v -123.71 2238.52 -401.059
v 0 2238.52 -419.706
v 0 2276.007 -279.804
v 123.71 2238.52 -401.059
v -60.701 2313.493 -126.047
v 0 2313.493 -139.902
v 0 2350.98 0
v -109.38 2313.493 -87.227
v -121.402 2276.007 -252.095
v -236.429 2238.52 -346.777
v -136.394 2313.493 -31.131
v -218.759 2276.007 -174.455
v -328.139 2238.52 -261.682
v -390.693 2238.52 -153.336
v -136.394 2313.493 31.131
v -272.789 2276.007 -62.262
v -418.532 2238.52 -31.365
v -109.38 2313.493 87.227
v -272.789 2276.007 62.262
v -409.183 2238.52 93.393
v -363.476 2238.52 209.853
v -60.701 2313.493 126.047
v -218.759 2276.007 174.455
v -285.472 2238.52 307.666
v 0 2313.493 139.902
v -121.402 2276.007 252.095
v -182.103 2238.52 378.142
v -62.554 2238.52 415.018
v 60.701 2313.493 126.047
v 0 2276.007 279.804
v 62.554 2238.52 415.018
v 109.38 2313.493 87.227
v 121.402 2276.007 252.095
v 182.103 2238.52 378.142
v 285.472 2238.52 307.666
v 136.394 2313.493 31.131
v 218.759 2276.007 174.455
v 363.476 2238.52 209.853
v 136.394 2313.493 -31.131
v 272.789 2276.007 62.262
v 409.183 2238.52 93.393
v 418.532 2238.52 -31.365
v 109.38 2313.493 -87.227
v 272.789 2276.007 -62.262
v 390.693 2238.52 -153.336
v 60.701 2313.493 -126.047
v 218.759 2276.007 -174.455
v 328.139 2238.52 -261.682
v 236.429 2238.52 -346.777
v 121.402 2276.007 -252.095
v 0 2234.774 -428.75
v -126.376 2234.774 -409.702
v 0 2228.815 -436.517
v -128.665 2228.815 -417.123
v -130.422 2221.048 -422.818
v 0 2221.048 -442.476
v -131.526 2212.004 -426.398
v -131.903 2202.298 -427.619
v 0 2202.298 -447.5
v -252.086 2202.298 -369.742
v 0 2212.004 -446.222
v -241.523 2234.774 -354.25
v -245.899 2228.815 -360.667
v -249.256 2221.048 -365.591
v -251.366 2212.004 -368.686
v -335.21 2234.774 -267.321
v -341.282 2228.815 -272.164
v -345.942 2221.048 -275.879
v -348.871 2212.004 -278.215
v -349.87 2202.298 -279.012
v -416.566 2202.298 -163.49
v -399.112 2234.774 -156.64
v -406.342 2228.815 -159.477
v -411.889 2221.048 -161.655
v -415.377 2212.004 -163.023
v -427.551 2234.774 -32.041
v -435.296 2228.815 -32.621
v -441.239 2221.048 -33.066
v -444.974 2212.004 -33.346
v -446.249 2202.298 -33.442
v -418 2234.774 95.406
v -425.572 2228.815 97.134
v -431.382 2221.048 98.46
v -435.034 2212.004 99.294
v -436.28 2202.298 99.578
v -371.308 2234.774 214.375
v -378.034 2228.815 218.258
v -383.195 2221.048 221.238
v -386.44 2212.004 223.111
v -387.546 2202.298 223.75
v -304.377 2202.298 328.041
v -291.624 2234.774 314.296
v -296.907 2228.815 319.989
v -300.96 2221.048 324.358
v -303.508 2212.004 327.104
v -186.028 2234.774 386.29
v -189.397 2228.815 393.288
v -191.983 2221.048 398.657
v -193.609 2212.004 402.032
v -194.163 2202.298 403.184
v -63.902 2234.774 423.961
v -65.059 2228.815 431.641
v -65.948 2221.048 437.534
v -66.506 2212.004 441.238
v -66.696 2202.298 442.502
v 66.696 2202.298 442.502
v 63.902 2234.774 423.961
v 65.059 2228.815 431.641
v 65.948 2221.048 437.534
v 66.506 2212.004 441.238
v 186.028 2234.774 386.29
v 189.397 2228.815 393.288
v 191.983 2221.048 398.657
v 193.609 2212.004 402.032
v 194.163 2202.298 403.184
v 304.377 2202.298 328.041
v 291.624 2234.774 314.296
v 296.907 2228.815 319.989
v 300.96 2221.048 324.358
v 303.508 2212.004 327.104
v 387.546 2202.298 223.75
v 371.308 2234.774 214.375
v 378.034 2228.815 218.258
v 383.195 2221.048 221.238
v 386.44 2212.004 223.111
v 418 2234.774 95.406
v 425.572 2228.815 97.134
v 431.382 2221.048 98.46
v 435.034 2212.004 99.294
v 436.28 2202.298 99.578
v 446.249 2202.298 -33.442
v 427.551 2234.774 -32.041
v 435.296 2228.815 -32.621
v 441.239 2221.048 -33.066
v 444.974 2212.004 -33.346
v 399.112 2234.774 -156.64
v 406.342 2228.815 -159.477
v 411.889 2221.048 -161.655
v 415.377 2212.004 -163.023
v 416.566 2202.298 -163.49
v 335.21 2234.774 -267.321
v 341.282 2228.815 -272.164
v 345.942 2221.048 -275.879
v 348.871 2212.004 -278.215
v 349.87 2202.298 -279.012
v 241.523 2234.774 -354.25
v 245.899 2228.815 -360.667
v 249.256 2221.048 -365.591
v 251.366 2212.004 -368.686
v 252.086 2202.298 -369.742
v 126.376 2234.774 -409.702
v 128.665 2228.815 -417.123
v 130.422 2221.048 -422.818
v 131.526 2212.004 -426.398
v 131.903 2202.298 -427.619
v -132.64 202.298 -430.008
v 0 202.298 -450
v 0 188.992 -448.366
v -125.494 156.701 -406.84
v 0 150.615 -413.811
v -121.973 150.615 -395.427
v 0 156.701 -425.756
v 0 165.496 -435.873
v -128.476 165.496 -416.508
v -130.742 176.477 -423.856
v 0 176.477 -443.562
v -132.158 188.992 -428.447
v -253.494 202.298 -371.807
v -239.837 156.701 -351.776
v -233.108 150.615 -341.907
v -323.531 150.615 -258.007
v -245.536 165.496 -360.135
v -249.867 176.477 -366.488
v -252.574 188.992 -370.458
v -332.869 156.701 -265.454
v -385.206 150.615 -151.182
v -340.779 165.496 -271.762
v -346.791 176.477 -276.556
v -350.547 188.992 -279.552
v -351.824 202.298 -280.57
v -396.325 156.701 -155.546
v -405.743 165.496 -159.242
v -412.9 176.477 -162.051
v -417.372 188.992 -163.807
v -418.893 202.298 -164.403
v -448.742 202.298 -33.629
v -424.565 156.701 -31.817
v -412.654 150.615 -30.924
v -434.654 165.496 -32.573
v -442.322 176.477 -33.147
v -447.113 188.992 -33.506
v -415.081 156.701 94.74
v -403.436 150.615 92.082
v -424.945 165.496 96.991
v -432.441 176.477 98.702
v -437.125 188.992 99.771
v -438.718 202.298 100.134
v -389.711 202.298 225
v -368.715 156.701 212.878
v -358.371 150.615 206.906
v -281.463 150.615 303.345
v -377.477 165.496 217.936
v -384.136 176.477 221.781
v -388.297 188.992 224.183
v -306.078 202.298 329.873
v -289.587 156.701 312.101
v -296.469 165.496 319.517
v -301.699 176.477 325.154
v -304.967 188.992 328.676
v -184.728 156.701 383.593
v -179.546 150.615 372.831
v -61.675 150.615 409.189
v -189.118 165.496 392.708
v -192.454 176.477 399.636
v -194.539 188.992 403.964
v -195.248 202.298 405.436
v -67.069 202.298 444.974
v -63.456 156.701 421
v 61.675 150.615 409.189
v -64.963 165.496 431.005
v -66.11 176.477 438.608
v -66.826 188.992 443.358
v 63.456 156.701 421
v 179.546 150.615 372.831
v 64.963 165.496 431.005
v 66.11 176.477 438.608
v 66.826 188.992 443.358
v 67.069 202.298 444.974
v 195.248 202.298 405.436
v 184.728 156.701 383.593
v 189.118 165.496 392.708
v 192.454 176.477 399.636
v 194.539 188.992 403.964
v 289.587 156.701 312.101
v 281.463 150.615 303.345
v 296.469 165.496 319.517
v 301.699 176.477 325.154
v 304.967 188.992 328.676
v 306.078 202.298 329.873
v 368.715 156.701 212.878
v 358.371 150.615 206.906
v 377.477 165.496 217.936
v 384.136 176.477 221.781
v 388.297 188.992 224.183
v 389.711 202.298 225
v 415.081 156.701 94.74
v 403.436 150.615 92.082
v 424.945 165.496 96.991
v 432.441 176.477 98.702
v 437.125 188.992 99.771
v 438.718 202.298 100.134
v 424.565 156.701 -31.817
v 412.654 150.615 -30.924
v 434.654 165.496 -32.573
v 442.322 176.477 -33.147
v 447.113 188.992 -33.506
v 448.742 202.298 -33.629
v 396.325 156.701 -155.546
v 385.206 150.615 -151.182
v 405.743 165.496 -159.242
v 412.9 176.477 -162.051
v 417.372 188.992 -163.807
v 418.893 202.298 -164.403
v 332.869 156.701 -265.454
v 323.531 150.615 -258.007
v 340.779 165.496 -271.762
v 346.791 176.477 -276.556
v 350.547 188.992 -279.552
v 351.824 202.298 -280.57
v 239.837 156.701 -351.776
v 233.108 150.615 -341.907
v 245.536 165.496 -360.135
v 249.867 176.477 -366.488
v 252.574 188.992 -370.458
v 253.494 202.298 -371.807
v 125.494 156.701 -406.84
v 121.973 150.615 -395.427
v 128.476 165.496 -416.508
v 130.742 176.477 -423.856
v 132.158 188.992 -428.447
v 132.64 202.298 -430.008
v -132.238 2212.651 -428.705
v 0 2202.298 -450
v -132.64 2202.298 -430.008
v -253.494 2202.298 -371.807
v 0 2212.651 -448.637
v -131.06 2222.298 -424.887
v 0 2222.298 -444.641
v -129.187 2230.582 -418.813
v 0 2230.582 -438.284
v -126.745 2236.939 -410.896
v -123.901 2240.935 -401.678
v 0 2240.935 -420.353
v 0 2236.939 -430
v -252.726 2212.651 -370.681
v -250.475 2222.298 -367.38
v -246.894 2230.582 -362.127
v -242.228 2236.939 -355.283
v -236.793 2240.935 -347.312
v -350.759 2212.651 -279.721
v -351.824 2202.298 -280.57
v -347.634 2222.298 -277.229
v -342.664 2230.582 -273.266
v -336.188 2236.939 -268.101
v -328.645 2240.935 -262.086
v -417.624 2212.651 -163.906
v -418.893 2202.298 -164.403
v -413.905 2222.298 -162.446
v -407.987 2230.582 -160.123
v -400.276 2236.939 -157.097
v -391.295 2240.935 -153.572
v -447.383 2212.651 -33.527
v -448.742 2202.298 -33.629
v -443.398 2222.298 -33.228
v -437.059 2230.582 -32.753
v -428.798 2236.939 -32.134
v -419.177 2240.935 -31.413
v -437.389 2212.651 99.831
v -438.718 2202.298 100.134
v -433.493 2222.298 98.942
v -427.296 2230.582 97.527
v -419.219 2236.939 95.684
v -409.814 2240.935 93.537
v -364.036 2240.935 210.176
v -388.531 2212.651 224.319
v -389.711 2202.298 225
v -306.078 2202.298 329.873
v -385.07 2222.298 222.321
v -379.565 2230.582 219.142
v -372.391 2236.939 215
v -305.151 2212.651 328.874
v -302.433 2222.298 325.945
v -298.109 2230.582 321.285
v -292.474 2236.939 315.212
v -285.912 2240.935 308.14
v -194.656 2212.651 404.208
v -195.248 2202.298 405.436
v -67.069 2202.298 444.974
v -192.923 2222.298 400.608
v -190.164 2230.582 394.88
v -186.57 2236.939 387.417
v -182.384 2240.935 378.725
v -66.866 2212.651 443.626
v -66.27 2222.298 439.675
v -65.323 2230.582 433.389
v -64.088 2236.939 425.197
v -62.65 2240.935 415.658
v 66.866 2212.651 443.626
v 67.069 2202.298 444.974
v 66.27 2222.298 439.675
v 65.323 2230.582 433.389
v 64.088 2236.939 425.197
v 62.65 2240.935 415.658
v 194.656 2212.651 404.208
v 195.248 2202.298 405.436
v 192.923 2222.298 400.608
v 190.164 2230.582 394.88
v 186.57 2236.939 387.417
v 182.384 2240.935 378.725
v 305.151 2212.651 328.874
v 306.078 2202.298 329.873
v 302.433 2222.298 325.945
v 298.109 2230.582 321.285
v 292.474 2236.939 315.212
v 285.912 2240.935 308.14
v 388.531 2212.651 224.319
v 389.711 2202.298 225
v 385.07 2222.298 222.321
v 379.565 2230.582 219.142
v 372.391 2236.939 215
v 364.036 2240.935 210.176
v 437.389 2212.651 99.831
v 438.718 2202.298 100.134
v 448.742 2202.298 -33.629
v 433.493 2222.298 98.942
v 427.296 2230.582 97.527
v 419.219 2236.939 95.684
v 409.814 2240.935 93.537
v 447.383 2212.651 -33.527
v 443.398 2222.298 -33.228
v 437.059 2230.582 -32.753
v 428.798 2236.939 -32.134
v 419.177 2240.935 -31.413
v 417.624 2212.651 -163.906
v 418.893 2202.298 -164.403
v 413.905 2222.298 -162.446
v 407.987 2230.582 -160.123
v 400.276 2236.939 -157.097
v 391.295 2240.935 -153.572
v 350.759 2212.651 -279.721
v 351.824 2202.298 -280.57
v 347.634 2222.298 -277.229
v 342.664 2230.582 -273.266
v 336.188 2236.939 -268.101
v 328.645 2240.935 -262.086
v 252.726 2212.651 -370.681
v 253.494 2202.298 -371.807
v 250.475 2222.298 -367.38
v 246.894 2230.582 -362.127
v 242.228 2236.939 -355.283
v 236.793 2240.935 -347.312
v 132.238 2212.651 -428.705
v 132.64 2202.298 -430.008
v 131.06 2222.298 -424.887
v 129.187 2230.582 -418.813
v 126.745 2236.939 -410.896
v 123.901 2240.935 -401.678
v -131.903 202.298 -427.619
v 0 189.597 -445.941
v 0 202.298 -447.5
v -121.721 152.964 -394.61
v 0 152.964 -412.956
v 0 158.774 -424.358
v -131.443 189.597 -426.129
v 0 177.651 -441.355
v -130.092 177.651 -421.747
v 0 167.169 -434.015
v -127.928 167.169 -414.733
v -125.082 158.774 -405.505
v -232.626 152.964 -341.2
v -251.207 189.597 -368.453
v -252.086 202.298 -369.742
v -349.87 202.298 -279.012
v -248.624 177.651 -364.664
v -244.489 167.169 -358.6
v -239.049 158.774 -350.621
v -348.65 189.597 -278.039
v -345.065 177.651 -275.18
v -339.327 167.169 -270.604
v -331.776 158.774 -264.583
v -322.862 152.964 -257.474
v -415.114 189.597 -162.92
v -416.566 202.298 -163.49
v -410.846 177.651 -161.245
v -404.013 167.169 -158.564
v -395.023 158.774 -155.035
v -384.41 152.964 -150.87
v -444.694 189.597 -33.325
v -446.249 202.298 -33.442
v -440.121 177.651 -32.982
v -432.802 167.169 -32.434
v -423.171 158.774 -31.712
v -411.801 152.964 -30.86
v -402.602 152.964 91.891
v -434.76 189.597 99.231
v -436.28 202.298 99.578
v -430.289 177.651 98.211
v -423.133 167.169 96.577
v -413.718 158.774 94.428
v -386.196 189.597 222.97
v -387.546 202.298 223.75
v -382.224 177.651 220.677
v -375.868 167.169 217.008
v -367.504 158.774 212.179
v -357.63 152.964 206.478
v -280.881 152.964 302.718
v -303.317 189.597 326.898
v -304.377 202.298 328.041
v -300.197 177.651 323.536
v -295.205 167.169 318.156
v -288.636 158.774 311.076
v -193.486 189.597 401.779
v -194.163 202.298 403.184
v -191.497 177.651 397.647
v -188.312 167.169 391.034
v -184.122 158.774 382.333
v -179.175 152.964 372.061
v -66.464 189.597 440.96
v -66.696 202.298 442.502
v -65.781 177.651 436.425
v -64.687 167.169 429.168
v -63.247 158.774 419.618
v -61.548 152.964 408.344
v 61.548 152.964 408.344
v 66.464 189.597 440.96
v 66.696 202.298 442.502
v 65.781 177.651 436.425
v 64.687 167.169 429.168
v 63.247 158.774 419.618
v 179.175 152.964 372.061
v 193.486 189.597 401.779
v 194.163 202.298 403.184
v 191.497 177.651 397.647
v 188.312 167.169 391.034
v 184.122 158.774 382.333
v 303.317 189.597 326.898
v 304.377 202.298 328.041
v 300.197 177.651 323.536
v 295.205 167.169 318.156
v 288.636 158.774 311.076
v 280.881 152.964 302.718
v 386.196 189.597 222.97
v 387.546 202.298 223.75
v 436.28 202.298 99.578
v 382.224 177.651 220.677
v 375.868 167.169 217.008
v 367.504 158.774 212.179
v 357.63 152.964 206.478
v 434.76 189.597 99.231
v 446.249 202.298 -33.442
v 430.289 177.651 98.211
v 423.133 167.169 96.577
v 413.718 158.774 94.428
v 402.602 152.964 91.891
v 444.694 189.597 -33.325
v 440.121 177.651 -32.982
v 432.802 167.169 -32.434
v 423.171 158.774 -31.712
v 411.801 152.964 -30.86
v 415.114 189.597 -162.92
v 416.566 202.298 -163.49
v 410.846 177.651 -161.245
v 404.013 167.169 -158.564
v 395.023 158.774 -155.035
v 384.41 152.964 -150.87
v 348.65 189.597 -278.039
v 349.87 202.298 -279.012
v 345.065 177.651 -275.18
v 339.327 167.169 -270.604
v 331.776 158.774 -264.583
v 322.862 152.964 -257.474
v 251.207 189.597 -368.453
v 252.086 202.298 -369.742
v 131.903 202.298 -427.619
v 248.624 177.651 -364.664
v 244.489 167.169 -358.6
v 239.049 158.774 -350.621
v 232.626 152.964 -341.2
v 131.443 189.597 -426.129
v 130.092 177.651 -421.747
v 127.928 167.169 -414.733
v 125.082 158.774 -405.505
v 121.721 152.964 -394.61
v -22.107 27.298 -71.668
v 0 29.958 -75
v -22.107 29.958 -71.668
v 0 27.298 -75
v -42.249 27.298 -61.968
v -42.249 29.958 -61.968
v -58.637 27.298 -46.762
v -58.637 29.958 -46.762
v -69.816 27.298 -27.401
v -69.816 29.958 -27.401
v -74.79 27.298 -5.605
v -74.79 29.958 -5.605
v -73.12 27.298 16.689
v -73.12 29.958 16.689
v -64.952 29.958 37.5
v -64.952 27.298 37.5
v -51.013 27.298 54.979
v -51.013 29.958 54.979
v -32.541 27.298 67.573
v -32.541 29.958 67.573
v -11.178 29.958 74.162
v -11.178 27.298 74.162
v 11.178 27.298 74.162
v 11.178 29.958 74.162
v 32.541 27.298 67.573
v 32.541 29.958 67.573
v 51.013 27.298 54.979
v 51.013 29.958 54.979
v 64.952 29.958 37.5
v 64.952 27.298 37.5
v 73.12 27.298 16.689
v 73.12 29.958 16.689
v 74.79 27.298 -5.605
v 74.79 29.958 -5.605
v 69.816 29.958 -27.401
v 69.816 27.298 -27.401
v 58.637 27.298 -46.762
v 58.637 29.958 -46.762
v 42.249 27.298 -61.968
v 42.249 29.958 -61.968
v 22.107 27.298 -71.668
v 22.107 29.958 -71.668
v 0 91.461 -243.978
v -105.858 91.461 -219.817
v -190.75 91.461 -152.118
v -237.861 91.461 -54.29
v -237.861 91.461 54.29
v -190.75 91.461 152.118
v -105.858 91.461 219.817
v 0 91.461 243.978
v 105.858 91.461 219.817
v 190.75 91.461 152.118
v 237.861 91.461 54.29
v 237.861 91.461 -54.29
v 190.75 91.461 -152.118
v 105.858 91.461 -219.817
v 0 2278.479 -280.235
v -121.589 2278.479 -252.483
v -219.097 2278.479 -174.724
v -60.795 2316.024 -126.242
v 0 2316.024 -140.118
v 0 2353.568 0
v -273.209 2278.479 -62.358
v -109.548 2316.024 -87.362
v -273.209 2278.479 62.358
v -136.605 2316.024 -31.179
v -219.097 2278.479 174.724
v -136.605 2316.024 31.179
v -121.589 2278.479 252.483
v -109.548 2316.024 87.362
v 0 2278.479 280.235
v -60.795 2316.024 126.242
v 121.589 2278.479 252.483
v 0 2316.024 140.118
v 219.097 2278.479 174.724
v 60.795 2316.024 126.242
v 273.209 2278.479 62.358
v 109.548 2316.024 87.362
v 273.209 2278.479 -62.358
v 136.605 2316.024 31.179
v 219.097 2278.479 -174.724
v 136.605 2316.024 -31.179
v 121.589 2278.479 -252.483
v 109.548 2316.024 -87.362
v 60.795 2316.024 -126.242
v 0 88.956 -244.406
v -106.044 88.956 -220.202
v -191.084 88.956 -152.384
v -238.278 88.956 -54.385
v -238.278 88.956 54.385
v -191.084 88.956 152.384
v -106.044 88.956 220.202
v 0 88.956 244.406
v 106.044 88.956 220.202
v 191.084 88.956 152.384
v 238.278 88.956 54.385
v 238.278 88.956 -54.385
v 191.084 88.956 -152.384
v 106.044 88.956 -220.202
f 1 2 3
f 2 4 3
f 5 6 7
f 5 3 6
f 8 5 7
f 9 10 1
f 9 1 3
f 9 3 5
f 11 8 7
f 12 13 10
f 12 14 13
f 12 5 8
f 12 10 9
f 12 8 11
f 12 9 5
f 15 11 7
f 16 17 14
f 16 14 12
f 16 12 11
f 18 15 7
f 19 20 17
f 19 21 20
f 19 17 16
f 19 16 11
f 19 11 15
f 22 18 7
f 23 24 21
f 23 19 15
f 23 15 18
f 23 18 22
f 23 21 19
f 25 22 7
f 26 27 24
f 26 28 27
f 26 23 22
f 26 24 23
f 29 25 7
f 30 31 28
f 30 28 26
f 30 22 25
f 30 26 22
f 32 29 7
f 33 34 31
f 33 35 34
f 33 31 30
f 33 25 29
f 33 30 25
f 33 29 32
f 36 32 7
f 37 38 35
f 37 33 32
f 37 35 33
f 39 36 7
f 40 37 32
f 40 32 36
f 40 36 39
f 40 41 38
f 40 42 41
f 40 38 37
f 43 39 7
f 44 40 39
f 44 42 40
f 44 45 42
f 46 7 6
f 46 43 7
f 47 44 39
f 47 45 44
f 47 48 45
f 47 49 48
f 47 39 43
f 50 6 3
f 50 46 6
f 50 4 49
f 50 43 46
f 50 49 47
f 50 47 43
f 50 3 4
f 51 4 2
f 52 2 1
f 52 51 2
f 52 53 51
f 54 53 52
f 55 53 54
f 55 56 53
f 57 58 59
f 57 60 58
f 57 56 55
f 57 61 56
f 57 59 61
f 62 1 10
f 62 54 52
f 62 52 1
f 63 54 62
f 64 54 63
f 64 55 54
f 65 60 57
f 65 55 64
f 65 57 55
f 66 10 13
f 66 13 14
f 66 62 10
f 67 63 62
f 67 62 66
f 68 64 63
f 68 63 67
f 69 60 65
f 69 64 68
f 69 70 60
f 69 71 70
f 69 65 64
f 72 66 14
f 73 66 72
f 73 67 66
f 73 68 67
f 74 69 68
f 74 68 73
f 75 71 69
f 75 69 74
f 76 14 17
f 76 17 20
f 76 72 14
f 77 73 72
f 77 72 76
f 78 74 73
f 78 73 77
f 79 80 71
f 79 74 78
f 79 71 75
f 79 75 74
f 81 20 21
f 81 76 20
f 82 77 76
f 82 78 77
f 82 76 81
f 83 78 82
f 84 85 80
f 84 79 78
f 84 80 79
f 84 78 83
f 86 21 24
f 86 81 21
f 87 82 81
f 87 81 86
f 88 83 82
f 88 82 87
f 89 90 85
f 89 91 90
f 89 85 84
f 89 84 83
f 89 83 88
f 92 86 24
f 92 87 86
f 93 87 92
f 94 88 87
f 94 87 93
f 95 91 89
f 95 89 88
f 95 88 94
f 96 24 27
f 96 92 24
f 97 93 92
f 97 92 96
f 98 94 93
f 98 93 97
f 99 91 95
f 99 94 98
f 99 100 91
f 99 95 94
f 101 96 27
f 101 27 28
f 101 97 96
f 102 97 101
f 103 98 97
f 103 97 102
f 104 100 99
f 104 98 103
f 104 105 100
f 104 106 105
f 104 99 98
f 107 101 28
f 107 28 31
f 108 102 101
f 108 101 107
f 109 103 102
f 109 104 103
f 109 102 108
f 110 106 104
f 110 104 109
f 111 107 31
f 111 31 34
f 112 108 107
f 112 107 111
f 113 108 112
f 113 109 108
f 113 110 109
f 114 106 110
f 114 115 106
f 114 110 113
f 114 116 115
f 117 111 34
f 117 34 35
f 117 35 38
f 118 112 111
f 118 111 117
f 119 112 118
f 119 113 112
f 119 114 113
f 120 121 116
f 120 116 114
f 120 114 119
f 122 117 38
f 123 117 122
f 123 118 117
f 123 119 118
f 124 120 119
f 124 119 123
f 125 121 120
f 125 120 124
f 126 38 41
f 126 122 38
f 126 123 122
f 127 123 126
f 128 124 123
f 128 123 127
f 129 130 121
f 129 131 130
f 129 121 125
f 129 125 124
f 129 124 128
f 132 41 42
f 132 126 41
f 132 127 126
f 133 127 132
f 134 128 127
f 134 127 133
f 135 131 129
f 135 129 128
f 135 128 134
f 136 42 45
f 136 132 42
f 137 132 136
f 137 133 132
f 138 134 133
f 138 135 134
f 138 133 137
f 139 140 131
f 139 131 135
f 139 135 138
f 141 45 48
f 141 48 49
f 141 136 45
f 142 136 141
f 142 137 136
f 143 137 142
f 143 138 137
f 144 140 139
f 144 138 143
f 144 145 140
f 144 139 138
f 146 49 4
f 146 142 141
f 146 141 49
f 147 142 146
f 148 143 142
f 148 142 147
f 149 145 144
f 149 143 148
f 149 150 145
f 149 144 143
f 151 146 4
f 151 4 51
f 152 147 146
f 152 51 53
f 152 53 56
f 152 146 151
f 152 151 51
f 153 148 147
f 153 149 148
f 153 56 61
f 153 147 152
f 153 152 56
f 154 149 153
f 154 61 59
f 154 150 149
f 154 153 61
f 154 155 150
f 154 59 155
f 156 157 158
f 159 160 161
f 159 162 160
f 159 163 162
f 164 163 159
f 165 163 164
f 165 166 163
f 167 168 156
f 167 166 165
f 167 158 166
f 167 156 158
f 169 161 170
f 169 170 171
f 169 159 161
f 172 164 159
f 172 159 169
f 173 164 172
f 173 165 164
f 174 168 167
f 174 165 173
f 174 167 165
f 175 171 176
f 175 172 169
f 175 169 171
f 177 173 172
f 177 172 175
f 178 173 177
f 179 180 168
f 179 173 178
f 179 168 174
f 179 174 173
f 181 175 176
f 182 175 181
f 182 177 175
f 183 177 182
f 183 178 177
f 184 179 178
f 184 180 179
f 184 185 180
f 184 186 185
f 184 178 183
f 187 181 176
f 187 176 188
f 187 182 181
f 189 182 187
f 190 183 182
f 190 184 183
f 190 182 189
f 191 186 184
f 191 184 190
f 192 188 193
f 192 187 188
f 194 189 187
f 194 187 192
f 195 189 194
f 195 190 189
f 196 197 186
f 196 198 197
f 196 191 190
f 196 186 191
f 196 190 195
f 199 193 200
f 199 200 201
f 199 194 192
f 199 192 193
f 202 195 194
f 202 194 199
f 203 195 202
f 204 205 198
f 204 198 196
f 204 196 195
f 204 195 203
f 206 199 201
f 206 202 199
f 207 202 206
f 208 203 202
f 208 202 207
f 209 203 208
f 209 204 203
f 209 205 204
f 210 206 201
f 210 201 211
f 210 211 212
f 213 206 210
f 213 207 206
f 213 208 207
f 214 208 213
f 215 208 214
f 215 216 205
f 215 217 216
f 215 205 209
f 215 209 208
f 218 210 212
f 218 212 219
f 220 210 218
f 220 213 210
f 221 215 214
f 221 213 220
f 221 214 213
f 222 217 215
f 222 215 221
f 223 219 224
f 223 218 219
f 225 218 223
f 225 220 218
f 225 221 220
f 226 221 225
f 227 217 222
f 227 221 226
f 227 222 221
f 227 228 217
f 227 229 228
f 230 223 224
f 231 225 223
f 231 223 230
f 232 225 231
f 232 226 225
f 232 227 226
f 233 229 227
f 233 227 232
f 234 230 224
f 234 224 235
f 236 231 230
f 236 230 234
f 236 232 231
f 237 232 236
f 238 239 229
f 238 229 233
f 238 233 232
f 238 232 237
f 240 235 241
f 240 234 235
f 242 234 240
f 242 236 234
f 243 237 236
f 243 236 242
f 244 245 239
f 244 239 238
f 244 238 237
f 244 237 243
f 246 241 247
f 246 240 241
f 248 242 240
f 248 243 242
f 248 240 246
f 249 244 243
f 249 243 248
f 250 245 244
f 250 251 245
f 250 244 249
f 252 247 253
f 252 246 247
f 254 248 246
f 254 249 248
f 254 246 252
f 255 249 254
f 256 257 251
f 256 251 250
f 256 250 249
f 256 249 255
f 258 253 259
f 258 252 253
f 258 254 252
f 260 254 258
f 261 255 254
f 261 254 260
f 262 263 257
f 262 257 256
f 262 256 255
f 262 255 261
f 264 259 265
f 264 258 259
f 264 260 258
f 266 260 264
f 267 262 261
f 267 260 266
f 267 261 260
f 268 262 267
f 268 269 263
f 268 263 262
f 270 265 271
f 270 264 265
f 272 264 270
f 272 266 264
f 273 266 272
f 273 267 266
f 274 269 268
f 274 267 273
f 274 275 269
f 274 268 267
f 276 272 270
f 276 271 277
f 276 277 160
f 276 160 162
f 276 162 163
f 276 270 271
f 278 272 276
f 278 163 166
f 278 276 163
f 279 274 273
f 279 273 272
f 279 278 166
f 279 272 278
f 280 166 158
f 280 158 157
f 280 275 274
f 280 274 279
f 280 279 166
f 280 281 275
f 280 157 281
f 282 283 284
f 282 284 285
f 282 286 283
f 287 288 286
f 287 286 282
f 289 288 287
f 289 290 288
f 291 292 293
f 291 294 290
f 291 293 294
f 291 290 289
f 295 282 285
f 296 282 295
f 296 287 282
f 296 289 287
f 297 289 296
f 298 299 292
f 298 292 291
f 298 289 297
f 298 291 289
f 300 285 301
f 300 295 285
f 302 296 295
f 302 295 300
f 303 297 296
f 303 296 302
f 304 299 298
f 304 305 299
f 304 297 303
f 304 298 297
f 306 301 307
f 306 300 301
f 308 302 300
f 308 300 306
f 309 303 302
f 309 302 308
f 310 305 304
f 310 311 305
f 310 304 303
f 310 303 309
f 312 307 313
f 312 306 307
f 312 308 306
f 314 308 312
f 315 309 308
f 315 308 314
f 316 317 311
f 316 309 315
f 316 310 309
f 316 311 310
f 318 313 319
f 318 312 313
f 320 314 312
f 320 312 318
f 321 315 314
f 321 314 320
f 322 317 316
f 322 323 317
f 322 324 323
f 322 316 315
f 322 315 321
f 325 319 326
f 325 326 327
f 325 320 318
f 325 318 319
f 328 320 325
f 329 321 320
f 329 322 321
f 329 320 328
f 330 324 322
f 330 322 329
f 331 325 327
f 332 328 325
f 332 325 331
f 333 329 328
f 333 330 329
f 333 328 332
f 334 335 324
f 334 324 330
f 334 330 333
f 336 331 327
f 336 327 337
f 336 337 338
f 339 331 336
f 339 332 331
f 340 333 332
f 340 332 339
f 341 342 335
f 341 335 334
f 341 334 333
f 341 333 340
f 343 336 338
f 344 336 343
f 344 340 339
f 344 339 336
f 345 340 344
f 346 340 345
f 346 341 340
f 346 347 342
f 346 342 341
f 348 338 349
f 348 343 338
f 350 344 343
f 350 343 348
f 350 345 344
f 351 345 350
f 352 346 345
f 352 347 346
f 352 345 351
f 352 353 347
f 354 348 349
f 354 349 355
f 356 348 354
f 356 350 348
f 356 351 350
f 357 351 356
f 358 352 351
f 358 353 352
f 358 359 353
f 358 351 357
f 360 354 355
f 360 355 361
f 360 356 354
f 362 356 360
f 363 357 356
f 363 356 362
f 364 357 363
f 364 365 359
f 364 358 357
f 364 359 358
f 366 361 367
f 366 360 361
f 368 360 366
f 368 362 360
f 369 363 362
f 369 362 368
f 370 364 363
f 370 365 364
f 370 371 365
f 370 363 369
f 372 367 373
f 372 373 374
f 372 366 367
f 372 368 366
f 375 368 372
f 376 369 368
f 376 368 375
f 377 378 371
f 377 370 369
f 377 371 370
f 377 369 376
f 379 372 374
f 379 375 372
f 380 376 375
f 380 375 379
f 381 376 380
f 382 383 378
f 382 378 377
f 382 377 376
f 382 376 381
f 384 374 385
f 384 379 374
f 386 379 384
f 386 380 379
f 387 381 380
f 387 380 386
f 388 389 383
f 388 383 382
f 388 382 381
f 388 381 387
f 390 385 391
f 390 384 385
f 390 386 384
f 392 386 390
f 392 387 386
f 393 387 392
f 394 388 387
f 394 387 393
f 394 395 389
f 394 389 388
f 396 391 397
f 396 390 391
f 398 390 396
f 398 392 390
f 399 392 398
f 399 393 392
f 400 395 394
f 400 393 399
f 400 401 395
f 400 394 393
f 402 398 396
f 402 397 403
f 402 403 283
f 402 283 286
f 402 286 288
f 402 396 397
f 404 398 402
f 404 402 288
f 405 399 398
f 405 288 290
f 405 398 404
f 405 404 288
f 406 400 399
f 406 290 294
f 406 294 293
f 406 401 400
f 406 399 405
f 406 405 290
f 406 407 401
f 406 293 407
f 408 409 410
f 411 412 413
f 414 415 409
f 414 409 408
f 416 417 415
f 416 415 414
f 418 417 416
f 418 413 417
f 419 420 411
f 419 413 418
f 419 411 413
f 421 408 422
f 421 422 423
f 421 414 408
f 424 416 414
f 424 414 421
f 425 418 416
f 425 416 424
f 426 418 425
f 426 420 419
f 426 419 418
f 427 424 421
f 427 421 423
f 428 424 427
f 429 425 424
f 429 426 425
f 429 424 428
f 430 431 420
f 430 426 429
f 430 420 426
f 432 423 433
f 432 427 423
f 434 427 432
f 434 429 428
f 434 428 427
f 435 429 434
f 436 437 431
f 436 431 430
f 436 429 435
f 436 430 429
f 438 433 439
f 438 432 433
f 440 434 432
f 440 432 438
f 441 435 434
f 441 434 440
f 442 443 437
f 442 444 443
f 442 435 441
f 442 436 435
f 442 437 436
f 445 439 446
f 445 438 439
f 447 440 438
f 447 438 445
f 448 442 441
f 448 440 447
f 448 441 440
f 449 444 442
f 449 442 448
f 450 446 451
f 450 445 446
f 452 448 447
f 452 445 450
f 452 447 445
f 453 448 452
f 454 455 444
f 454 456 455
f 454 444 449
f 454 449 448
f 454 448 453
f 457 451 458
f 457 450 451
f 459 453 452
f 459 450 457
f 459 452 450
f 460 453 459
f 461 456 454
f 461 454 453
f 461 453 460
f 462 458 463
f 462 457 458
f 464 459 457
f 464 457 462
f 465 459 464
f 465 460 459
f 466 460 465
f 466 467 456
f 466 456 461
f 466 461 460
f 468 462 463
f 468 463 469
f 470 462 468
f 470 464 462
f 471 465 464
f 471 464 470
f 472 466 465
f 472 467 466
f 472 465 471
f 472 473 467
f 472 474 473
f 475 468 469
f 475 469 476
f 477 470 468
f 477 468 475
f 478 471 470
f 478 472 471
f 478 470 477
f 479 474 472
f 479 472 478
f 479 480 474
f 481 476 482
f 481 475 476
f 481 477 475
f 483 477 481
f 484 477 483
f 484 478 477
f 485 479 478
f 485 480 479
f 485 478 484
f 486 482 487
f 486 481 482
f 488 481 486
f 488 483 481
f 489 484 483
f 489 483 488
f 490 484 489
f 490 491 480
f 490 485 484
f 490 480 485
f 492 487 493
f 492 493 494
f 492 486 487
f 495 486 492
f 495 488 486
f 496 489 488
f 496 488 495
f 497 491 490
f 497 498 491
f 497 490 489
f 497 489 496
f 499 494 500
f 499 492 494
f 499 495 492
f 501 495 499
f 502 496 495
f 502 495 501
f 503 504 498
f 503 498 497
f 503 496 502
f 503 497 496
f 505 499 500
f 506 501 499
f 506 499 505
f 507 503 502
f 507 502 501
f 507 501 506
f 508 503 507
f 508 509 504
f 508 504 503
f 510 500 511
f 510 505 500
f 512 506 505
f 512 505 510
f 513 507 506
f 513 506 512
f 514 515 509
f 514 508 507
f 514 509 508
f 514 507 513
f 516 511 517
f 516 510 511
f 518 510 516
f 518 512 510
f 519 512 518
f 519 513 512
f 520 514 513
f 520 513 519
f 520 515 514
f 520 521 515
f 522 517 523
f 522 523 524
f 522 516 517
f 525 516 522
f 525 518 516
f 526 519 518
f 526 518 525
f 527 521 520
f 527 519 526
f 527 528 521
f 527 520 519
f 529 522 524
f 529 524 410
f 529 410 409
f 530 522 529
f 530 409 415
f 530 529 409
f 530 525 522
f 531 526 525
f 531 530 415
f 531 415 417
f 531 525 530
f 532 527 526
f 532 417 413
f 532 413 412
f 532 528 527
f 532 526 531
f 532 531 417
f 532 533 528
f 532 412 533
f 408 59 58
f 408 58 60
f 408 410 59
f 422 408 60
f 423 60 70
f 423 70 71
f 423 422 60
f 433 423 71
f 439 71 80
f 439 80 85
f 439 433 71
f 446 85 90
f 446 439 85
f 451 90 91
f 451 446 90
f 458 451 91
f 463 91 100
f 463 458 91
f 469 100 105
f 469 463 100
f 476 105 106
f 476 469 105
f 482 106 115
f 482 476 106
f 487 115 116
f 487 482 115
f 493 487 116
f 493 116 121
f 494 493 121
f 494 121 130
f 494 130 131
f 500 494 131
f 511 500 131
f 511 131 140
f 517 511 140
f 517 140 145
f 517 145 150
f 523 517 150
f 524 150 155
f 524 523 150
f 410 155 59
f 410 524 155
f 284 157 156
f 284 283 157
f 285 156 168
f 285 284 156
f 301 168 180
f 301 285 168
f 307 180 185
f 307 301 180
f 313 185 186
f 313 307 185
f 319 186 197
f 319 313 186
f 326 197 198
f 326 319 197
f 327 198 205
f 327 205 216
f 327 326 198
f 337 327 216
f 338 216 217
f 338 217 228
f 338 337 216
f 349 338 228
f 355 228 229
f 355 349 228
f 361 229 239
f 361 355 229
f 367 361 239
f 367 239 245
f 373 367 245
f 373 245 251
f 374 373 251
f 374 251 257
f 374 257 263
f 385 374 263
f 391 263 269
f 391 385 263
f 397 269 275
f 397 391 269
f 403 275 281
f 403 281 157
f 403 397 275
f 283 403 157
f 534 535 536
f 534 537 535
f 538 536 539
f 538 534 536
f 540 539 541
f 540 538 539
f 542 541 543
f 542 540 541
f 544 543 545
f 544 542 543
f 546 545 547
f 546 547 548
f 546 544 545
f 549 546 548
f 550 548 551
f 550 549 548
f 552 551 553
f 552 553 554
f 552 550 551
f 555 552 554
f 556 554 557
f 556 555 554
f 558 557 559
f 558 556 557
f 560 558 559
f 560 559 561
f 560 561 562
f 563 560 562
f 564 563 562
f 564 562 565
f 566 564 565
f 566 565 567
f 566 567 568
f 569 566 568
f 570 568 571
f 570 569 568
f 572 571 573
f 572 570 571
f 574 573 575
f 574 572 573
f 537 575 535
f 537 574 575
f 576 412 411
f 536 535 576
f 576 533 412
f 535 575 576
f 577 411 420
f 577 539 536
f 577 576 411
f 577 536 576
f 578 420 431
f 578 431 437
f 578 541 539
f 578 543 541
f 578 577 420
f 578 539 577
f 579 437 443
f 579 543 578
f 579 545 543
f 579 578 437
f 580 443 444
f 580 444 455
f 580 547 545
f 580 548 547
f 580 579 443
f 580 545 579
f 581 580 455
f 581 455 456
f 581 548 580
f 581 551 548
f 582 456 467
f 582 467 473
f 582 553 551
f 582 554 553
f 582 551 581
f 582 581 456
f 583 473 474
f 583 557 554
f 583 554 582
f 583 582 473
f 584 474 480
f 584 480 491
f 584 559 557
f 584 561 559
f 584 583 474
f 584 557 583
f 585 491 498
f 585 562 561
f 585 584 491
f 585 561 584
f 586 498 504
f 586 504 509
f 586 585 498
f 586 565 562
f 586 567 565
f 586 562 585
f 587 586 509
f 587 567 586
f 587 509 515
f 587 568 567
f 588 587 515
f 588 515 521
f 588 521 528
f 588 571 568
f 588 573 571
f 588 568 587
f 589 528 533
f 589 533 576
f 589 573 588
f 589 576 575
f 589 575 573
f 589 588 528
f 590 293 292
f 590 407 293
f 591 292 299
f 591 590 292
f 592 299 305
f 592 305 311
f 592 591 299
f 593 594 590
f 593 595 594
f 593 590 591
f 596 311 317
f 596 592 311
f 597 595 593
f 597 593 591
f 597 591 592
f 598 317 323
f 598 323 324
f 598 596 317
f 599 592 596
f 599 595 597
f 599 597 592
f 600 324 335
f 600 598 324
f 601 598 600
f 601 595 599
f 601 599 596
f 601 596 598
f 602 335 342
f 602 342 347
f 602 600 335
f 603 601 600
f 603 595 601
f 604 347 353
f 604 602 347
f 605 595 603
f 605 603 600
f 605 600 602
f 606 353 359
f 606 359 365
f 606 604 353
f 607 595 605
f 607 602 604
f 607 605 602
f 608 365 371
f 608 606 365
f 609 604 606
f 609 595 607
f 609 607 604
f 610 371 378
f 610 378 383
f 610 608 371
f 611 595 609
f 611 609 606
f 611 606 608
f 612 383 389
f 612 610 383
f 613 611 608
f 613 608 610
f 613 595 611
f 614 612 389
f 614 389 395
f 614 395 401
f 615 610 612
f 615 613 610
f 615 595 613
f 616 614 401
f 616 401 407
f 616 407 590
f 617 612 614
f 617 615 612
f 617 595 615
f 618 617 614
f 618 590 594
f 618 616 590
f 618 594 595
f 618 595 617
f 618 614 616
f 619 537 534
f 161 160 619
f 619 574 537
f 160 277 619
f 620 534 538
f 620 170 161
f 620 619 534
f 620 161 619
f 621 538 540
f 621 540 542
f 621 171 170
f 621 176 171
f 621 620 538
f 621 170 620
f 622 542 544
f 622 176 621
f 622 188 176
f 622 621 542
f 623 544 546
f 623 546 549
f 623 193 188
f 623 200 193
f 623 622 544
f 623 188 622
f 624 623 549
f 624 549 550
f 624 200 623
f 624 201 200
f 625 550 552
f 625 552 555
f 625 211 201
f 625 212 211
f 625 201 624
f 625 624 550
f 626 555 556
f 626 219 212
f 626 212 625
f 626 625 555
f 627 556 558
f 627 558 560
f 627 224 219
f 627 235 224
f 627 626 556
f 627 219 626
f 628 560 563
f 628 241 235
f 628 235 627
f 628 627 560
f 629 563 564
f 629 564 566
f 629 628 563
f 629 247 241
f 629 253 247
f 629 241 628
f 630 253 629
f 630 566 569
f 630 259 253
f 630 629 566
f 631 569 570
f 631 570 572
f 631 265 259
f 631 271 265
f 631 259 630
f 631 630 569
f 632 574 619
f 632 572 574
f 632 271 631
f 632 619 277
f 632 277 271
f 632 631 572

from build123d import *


with BuildPart() as part:
    # Skizze1 → Rotation4 (revolve)
    with BuildSketch(Plane.XY, mode=Mode.PRIVATE) as rotation4_sk:
        with BuildLine():
            Line((-75, 27.29776757), (-413.811107883, 150.614925878))
            ThreePointArc((-413.811107883, 150.614925878), (-440.053362436, 170.751316022), (-450, 202.298020021))
            Line((-450, 202.298020021), (-450, 2202.298020021))
            ThreePointArc((-450, 2202.298020021), (-441.734133612, 2226.648477182), (-420.352761804, 2240.935053073))
            Line((-420.352761804, 2240.935053073), (0, 2353.568236134))
            Line((0, 2353.568236134), (0, 2350.980045683))
            Line((0, 2350.980045683), (-419.705714191, 2238.520238507))
            ThreePointArc((-419.705714191, 2238.520238507), (-439.750750261, 2225.126573609), (-447.5, 2202.298020021))
            Line((-447.5, 2202.298020021), (-447.5, 202.298020021))
            ThreePointArc((-447.5, 202.298020021), (-438.005482325, 172.185257113), (-412.956057525, 152.96415743))
            Line((-412.956057525, 152.96415743), (-75, 29.958212001))
            Line((-75, 29.958212001), (-75, 27.29776757))
        make_face()
    revolve(rotation4_sk.sketch.rotate(Axis((0, 0, 0), (0, 1, 0)), 270), axis=Axis((0, 0, 0), (0, 1, 0)))  # turned: the seam where the file's is


solid = part.part
